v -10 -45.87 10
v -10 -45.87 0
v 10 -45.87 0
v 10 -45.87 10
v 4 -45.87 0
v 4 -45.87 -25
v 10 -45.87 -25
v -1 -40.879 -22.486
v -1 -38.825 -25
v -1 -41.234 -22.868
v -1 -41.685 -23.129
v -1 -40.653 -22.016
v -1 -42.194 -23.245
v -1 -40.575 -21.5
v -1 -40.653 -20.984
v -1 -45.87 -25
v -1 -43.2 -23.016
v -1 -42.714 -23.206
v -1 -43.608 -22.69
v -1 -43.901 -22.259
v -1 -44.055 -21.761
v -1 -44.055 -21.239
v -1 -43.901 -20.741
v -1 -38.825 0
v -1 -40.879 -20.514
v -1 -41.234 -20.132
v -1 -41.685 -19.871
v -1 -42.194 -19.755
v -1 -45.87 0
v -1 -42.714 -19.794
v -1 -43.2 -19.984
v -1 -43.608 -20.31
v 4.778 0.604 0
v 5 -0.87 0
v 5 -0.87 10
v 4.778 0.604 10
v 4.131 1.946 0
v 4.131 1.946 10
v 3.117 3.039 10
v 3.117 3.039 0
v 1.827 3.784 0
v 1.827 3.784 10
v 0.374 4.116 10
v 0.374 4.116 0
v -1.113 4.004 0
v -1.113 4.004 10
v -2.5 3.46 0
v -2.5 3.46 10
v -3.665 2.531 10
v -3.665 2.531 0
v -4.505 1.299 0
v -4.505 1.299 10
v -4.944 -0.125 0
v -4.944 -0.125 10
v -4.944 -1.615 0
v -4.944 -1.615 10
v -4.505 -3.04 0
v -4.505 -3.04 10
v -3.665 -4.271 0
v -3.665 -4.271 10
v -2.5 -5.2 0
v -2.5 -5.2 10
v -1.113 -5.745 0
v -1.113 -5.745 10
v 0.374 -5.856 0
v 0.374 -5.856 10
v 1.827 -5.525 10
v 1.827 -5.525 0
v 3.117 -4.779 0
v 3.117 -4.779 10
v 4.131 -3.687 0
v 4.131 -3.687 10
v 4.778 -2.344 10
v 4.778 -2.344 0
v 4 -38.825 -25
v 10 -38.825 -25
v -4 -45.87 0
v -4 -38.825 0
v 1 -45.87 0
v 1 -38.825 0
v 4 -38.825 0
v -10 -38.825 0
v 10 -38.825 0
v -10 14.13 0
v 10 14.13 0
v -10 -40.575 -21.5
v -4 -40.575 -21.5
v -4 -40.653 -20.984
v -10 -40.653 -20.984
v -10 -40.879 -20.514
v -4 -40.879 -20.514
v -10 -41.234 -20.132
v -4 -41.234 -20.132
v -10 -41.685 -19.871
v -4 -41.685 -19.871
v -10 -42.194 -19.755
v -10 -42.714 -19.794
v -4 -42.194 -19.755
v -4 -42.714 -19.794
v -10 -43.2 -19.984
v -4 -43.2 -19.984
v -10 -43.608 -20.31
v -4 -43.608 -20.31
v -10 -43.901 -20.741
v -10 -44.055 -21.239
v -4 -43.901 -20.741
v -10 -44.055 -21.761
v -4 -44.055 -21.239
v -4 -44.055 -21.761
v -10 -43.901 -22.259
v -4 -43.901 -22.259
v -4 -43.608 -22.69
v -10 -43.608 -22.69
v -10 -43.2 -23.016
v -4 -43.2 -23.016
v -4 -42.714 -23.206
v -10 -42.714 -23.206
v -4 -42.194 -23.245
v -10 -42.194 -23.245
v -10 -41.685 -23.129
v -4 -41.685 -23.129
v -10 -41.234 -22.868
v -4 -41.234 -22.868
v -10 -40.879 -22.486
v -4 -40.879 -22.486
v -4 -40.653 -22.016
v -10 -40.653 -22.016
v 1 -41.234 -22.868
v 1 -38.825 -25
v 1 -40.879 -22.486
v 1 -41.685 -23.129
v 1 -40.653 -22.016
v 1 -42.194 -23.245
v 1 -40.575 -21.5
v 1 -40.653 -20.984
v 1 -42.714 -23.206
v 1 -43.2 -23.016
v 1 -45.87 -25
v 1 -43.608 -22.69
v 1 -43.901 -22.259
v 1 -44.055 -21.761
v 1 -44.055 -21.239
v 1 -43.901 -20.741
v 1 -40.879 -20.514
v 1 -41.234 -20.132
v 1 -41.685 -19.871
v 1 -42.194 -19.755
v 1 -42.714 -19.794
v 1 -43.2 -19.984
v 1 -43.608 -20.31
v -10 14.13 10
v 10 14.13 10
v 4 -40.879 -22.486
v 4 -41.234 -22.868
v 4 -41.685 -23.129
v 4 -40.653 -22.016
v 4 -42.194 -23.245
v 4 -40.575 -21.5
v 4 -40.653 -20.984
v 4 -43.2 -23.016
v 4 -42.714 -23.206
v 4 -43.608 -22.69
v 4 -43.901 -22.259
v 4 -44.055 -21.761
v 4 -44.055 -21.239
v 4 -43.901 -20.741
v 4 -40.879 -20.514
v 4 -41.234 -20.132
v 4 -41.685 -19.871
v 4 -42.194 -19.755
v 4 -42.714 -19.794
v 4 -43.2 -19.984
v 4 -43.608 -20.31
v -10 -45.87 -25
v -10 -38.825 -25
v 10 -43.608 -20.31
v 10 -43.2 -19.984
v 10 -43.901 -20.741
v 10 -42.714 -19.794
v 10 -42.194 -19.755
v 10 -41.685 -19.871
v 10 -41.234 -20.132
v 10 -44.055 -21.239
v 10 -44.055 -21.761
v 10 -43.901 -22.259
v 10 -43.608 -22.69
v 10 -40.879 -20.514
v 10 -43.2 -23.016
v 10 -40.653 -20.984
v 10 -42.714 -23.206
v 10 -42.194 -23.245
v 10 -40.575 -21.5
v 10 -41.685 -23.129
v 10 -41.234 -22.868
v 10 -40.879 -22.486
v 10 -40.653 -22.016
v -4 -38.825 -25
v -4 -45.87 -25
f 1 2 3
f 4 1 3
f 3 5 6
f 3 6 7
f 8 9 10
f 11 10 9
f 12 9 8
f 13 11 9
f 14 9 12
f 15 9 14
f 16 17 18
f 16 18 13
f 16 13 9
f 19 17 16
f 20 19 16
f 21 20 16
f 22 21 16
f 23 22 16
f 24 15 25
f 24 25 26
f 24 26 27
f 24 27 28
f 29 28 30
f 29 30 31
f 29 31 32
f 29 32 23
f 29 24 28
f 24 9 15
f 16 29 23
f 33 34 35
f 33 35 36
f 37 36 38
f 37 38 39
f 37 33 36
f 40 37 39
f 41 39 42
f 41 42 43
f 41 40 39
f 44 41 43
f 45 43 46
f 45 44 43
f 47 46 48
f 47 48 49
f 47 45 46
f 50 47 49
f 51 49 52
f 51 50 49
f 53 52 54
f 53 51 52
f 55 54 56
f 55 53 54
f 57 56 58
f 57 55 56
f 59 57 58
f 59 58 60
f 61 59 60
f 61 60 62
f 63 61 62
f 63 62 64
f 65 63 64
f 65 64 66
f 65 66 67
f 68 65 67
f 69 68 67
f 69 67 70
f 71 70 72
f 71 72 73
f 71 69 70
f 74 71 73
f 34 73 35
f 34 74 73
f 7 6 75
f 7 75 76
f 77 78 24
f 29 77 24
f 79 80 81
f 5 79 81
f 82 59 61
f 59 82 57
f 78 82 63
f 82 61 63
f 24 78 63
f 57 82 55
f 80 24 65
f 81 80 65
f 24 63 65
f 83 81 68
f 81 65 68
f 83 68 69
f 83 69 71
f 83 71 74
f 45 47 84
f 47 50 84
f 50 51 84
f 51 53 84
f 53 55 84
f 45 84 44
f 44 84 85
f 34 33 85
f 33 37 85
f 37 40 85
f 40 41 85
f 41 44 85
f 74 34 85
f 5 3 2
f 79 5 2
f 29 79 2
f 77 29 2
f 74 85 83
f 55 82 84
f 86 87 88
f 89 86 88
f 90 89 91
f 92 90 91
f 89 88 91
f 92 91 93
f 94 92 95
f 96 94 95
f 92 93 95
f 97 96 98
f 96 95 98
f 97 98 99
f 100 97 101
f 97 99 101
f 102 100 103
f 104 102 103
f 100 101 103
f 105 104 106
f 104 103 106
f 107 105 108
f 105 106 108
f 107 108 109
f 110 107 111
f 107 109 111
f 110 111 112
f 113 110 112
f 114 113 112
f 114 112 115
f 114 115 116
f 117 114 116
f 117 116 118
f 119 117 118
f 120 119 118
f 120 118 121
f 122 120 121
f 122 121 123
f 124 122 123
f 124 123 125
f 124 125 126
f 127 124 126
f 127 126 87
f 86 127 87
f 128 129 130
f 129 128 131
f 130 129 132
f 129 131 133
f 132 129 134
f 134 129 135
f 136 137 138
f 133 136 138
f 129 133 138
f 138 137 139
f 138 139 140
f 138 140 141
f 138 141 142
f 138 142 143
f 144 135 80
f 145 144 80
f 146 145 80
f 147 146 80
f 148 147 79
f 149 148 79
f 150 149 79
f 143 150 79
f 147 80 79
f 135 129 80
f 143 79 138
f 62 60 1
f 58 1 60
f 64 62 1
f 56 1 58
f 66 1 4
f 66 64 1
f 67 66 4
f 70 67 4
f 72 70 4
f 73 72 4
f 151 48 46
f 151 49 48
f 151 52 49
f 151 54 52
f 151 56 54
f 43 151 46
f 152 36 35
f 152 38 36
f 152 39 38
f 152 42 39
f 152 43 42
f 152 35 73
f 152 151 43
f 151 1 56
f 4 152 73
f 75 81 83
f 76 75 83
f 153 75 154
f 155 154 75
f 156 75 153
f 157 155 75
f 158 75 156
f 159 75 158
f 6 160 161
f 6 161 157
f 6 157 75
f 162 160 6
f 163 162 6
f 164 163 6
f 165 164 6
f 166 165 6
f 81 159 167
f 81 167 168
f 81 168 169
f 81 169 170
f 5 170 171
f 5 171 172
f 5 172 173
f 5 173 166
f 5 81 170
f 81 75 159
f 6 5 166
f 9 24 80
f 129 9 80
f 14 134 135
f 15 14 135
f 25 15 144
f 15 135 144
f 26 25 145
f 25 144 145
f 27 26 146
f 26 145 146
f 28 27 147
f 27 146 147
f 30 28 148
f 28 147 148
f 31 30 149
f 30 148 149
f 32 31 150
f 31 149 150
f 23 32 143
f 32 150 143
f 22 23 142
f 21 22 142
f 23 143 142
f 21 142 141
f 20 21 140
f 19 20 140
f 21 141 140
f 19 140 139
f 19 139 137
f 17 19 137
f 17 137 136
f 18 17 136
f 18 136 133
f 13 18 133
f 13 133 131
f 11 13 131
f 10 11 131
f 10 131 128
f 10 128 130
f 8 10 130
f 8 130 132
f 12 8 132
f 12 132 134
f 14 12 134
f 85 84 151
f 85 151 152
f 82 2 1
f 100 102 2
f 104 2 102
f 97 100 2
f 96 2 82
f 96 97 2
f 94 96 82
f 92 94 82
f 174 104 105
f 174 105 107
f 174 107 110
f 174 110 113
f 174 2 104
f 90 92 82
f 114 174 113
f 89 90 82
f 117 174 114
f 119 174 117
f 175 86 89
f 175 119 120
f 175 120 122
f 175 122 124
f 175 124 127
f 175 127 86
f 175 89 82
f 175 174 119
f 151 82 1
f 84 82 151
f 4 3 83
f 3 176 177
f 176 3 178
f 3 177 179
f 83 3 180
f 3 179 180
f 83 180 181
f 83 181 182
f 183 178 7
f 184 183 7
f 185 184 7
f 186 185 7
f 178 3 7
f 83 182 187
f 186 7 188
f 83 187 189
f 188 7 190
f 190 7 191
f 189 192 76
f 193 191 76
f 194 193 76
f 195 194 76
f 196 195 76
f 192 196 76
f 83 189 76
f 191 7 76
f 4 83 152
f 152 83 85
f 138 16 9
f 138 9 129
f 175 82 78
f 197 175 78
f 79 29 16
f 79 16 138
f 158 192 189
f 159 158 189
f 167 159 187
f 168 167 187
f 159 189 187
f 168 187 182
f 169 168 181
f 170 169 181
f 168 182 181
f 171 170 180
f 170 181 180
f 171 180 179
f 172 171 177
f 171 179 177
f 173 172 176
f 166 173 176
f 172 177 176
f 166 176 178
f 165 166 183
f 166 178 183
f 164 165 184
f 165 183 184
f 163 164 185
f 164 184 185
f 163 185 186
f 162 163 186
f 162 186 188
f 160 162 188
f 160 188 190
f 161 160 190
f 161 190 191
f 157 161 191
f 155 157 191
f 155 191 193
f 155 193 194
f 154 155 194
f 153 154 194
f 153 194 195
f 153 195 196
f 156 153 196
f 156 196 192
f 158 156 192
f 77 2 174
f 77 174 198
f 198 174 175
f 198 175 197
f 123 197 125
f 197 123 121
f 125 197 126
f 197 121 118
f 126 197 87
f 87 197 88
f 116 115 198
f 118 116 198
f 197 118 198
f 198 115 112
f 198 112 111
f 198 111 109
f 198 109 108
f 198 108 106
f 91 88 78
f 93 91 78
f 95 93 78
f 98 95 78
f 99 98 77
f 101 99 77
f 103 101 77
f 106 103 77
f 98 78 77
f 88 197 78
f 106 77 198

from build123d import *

# Parameters (mm, degrees)
F0_W     = 20
F0_H     = 60
F0_R     = 5
F1_DEPTH = 10
F2_W     = 2
F2_H     = 7.045413
F2_W_2   = 6
F3_DEPTH = 25
F4_R     = 1.75
F5_DEPTH = 25


with BuildPart() as f1:
    # F0 (on Top) → F1 (new body)
    with BuildSketch(Plane.XY):
        with Locations((0, -15.870169)):
            Rectangle(F0_W, F0_H)
        with Locations((0, -0.870169)):
            Circle(F0_R, mode=Mode.SUBTRACT)
    extrude(amount=F1_DEPTH)

    # F2 (on face) → F3 (join)
    with BuildSketch(Plane(origin=(0, 0, 0), x_dir=(1, 0, 0), z_dir=(0, 0, -1))):
        with Locations((0, 42.347462)):
            Rectangle(F2_W, F2_H)
        with Locations((-7, 42.347462)):
            Rectangle(F2_W_2, F2_H)
        with Locations((7, 42.347462)):
            Rectangle(F2_W_2, F2_H)
    extrude(amount=F3_DEPTH)

    # F4 (on face) → F5 (cut)
    with BuildSketch(Plane.YZ.offset(10)):
        with Locations((-42.324756, -21.5)):
            Circle(F4_R)
    extrude(amount=-F5_DEPTH, mode=Mode.SUBTRACT)


solid = f1.part
